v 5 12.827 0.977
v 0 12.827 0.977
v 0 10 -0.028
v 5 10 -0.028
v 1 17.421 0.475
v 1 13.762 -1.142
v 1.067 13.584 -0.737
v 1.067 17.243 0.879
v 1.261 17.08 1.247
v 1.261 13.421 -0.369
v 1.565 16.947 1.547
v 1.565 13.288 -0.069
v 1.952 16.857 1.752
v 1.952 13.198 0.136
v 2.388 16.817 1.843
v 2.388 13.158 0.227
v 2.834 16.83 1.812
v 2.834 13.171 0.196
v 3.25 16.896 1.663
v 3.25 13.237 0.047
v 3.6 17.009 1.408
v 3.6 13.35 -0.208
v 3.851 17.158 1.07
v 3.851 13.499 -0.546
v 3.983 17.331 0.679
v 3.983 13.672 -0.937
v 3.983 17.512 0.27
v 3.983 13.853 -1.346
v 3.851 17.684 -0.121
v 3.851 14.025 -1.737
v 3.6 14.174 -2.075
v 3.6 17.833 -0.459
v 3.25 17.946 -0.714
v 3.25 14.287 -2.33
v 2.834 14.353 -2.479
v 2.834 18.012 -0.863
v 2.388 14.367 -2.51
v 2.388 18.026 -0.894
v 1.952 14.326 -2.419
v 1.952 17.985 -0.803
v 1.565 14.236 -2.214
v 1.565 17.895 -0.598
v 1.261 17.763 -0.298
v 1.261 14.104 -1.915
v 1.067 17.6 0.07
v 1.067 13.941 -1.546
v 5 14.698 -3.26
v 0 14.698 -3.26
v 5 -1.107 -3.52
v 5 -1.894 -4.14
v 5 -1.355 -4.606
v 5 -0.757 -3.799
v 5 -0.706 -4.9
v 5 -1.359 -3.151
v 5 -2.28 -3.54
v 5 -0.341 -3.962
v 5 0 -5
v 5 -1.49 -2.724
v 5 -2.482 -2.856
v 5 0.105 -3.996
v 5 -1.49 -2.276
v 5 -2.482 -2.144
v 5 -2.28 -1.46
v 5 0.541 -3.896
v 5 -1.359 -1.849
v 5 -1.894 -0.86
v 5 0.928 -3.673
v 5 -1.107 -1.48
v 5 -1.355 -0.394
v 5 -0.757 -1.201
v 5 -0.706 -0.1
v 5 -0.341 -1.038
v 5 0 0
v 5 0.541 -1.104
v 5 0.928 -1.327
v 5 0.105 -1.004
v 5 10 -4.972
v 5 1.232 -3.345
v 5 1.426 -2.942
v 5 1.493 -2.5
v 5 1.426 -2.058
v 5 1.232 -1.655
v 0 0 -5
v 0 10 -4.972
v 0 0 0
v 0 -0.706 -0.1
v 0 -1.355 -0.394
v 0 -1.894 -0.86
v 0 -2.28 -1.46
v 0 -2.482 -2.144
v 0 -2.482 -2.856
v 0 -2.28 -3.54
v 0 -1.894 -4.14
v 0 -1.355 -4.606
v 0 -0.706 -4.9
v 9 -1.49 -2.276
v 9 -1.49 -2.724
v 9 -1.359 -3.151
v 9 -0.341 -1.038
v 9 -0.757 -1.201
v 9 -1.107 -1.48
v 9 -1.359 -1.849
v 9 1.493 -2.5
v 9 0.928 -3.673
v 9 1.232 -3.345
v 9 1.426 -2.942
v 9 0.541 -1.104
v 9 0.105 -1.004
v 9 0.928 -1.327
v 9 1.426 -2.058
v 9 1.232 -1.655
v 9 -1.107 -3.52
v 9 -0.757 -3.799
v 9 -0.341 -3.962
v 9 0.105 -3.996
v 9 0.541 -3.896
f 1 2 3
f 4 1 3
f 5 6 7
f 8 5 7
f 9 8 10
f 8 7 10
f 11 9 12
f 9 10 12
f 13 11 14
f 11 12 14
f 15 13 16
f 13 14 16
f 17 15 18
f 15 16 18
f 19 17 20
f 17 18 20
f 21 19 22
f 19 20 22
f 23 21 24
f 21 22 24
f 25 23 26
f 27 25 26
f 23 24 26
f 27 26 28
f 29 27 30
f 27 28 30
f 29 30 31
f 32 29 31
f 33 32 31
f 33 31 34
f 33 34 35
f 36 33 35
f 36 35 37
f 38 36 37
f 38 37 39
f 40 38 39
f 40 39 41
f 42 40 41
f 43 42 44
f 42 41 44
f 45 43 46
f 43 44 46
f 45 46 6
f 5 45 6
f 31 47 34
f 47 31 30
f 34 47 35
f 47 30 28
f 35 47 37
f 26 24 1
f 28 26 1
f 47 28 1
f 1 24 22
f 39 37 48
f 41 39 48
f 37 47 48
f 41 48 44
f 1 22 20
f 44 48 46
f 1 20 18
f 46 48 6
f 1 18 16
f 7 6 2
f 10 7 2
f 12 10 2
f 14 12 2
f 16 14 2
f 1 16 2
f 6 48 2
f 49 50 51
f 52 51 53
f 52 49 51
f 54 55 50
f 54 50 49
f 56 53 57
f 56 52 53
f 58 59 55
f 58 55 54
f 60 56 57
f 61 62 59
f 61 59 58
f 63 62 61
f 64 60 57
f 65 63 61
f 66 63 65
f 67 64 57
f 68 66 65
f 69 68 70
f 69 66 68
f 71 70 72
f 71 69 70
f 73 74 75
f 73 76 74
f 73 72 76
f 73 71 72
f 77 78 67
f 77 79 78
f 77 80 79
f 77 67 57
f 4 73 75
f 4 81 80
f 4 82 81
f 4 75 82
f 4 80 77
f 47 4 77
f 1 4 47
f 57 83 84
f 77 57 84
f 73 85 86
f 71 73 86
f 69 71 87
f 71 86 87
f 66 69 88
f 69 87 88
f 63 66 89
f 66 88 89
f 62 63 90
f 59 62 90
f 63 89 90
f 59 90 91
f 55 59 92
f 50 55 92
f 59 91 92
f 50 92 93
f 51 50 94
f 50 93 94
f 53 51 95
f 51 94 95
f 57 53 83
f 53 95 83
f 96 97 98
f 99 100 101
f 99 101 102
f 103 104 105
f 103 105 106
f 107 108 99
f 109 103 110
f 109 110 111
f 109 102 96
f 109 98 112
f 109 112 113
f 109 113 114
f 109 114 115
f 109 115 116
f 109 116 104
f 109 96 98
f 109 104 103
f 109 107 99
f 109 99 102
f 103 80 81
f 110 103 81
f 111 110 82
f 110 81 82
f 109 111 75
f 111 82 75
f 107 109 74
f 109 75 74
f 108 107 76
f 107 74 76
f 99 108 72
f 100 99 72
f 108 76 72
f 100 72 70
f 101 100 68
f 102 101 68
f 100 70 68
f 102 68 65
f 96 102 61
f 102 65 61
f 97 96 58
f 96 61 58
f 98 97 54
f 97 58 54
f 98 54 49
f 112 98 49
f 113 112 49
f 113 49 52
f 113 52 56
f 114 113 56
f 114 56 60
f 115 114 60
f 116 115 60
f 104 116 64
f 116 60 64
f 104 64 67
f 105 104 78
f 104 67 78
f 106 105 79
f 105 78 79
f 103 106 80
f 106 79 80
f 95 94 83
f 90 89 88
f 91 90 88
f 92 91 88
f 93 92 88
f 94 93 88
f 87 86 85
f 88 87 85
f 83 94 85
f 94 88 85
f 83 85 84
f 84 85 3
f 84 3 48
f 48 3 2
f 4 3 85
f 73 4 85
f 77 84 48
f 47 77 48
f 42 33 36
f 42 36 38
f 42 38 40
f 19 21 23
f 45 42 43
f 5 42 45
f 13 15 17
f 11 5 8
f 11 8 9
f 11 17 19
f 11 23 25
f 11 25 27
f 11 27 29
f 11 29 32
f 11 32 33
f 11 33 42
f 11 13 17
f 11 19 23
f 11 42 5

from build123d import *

# Parameters (mm, degrees)
F1_DEPTH = 5
F3_R     = 1.5
F4_DEPTH = 4
F2_R     = 1.5
F5_DEPTH = 4


with BuildPart() as f1:
    # F0 (on Right) → F1 (new body)
    with BuildSketch(Plane.YZ):
        Polygon((9.9999599028, -0.028318582), (0, 0), (0, -5), (9.9999599028, -4.971681418), (14.6977243388, -3.2596623456), (12.8266741155, 0.9765131251), align=None)
        with BuildLine():
            Line((0, -5), (0, 0))
            ThreePointArc((0, 0), (-2.5070896982, -2.5), (0, -5))
        make_face()
    extrude(amount=F1_DEPTH)

    # F3 (on face) → F4 (join)
    with BuildSketch(Plane.YZ.offset(5)):
        with Locations((-0.0070796739, -2.5)):
            Circle(F3_R)
    extrude(amount=F4_DEPTH)

    # F2 (on face) → F5 (join)
    with BuildSketch(Plane(origin=(0, 11.0937619601, 4.8999353157), x_dir=(-1, 0, 0), z_dir=(0, 0.9147463248, 0.4040286639))):
        with Locations((-2.5, -6.6045741447)):
            Circle(F2_R)
    extrude(amount=F5_DEPTH)


solid = f1.part
